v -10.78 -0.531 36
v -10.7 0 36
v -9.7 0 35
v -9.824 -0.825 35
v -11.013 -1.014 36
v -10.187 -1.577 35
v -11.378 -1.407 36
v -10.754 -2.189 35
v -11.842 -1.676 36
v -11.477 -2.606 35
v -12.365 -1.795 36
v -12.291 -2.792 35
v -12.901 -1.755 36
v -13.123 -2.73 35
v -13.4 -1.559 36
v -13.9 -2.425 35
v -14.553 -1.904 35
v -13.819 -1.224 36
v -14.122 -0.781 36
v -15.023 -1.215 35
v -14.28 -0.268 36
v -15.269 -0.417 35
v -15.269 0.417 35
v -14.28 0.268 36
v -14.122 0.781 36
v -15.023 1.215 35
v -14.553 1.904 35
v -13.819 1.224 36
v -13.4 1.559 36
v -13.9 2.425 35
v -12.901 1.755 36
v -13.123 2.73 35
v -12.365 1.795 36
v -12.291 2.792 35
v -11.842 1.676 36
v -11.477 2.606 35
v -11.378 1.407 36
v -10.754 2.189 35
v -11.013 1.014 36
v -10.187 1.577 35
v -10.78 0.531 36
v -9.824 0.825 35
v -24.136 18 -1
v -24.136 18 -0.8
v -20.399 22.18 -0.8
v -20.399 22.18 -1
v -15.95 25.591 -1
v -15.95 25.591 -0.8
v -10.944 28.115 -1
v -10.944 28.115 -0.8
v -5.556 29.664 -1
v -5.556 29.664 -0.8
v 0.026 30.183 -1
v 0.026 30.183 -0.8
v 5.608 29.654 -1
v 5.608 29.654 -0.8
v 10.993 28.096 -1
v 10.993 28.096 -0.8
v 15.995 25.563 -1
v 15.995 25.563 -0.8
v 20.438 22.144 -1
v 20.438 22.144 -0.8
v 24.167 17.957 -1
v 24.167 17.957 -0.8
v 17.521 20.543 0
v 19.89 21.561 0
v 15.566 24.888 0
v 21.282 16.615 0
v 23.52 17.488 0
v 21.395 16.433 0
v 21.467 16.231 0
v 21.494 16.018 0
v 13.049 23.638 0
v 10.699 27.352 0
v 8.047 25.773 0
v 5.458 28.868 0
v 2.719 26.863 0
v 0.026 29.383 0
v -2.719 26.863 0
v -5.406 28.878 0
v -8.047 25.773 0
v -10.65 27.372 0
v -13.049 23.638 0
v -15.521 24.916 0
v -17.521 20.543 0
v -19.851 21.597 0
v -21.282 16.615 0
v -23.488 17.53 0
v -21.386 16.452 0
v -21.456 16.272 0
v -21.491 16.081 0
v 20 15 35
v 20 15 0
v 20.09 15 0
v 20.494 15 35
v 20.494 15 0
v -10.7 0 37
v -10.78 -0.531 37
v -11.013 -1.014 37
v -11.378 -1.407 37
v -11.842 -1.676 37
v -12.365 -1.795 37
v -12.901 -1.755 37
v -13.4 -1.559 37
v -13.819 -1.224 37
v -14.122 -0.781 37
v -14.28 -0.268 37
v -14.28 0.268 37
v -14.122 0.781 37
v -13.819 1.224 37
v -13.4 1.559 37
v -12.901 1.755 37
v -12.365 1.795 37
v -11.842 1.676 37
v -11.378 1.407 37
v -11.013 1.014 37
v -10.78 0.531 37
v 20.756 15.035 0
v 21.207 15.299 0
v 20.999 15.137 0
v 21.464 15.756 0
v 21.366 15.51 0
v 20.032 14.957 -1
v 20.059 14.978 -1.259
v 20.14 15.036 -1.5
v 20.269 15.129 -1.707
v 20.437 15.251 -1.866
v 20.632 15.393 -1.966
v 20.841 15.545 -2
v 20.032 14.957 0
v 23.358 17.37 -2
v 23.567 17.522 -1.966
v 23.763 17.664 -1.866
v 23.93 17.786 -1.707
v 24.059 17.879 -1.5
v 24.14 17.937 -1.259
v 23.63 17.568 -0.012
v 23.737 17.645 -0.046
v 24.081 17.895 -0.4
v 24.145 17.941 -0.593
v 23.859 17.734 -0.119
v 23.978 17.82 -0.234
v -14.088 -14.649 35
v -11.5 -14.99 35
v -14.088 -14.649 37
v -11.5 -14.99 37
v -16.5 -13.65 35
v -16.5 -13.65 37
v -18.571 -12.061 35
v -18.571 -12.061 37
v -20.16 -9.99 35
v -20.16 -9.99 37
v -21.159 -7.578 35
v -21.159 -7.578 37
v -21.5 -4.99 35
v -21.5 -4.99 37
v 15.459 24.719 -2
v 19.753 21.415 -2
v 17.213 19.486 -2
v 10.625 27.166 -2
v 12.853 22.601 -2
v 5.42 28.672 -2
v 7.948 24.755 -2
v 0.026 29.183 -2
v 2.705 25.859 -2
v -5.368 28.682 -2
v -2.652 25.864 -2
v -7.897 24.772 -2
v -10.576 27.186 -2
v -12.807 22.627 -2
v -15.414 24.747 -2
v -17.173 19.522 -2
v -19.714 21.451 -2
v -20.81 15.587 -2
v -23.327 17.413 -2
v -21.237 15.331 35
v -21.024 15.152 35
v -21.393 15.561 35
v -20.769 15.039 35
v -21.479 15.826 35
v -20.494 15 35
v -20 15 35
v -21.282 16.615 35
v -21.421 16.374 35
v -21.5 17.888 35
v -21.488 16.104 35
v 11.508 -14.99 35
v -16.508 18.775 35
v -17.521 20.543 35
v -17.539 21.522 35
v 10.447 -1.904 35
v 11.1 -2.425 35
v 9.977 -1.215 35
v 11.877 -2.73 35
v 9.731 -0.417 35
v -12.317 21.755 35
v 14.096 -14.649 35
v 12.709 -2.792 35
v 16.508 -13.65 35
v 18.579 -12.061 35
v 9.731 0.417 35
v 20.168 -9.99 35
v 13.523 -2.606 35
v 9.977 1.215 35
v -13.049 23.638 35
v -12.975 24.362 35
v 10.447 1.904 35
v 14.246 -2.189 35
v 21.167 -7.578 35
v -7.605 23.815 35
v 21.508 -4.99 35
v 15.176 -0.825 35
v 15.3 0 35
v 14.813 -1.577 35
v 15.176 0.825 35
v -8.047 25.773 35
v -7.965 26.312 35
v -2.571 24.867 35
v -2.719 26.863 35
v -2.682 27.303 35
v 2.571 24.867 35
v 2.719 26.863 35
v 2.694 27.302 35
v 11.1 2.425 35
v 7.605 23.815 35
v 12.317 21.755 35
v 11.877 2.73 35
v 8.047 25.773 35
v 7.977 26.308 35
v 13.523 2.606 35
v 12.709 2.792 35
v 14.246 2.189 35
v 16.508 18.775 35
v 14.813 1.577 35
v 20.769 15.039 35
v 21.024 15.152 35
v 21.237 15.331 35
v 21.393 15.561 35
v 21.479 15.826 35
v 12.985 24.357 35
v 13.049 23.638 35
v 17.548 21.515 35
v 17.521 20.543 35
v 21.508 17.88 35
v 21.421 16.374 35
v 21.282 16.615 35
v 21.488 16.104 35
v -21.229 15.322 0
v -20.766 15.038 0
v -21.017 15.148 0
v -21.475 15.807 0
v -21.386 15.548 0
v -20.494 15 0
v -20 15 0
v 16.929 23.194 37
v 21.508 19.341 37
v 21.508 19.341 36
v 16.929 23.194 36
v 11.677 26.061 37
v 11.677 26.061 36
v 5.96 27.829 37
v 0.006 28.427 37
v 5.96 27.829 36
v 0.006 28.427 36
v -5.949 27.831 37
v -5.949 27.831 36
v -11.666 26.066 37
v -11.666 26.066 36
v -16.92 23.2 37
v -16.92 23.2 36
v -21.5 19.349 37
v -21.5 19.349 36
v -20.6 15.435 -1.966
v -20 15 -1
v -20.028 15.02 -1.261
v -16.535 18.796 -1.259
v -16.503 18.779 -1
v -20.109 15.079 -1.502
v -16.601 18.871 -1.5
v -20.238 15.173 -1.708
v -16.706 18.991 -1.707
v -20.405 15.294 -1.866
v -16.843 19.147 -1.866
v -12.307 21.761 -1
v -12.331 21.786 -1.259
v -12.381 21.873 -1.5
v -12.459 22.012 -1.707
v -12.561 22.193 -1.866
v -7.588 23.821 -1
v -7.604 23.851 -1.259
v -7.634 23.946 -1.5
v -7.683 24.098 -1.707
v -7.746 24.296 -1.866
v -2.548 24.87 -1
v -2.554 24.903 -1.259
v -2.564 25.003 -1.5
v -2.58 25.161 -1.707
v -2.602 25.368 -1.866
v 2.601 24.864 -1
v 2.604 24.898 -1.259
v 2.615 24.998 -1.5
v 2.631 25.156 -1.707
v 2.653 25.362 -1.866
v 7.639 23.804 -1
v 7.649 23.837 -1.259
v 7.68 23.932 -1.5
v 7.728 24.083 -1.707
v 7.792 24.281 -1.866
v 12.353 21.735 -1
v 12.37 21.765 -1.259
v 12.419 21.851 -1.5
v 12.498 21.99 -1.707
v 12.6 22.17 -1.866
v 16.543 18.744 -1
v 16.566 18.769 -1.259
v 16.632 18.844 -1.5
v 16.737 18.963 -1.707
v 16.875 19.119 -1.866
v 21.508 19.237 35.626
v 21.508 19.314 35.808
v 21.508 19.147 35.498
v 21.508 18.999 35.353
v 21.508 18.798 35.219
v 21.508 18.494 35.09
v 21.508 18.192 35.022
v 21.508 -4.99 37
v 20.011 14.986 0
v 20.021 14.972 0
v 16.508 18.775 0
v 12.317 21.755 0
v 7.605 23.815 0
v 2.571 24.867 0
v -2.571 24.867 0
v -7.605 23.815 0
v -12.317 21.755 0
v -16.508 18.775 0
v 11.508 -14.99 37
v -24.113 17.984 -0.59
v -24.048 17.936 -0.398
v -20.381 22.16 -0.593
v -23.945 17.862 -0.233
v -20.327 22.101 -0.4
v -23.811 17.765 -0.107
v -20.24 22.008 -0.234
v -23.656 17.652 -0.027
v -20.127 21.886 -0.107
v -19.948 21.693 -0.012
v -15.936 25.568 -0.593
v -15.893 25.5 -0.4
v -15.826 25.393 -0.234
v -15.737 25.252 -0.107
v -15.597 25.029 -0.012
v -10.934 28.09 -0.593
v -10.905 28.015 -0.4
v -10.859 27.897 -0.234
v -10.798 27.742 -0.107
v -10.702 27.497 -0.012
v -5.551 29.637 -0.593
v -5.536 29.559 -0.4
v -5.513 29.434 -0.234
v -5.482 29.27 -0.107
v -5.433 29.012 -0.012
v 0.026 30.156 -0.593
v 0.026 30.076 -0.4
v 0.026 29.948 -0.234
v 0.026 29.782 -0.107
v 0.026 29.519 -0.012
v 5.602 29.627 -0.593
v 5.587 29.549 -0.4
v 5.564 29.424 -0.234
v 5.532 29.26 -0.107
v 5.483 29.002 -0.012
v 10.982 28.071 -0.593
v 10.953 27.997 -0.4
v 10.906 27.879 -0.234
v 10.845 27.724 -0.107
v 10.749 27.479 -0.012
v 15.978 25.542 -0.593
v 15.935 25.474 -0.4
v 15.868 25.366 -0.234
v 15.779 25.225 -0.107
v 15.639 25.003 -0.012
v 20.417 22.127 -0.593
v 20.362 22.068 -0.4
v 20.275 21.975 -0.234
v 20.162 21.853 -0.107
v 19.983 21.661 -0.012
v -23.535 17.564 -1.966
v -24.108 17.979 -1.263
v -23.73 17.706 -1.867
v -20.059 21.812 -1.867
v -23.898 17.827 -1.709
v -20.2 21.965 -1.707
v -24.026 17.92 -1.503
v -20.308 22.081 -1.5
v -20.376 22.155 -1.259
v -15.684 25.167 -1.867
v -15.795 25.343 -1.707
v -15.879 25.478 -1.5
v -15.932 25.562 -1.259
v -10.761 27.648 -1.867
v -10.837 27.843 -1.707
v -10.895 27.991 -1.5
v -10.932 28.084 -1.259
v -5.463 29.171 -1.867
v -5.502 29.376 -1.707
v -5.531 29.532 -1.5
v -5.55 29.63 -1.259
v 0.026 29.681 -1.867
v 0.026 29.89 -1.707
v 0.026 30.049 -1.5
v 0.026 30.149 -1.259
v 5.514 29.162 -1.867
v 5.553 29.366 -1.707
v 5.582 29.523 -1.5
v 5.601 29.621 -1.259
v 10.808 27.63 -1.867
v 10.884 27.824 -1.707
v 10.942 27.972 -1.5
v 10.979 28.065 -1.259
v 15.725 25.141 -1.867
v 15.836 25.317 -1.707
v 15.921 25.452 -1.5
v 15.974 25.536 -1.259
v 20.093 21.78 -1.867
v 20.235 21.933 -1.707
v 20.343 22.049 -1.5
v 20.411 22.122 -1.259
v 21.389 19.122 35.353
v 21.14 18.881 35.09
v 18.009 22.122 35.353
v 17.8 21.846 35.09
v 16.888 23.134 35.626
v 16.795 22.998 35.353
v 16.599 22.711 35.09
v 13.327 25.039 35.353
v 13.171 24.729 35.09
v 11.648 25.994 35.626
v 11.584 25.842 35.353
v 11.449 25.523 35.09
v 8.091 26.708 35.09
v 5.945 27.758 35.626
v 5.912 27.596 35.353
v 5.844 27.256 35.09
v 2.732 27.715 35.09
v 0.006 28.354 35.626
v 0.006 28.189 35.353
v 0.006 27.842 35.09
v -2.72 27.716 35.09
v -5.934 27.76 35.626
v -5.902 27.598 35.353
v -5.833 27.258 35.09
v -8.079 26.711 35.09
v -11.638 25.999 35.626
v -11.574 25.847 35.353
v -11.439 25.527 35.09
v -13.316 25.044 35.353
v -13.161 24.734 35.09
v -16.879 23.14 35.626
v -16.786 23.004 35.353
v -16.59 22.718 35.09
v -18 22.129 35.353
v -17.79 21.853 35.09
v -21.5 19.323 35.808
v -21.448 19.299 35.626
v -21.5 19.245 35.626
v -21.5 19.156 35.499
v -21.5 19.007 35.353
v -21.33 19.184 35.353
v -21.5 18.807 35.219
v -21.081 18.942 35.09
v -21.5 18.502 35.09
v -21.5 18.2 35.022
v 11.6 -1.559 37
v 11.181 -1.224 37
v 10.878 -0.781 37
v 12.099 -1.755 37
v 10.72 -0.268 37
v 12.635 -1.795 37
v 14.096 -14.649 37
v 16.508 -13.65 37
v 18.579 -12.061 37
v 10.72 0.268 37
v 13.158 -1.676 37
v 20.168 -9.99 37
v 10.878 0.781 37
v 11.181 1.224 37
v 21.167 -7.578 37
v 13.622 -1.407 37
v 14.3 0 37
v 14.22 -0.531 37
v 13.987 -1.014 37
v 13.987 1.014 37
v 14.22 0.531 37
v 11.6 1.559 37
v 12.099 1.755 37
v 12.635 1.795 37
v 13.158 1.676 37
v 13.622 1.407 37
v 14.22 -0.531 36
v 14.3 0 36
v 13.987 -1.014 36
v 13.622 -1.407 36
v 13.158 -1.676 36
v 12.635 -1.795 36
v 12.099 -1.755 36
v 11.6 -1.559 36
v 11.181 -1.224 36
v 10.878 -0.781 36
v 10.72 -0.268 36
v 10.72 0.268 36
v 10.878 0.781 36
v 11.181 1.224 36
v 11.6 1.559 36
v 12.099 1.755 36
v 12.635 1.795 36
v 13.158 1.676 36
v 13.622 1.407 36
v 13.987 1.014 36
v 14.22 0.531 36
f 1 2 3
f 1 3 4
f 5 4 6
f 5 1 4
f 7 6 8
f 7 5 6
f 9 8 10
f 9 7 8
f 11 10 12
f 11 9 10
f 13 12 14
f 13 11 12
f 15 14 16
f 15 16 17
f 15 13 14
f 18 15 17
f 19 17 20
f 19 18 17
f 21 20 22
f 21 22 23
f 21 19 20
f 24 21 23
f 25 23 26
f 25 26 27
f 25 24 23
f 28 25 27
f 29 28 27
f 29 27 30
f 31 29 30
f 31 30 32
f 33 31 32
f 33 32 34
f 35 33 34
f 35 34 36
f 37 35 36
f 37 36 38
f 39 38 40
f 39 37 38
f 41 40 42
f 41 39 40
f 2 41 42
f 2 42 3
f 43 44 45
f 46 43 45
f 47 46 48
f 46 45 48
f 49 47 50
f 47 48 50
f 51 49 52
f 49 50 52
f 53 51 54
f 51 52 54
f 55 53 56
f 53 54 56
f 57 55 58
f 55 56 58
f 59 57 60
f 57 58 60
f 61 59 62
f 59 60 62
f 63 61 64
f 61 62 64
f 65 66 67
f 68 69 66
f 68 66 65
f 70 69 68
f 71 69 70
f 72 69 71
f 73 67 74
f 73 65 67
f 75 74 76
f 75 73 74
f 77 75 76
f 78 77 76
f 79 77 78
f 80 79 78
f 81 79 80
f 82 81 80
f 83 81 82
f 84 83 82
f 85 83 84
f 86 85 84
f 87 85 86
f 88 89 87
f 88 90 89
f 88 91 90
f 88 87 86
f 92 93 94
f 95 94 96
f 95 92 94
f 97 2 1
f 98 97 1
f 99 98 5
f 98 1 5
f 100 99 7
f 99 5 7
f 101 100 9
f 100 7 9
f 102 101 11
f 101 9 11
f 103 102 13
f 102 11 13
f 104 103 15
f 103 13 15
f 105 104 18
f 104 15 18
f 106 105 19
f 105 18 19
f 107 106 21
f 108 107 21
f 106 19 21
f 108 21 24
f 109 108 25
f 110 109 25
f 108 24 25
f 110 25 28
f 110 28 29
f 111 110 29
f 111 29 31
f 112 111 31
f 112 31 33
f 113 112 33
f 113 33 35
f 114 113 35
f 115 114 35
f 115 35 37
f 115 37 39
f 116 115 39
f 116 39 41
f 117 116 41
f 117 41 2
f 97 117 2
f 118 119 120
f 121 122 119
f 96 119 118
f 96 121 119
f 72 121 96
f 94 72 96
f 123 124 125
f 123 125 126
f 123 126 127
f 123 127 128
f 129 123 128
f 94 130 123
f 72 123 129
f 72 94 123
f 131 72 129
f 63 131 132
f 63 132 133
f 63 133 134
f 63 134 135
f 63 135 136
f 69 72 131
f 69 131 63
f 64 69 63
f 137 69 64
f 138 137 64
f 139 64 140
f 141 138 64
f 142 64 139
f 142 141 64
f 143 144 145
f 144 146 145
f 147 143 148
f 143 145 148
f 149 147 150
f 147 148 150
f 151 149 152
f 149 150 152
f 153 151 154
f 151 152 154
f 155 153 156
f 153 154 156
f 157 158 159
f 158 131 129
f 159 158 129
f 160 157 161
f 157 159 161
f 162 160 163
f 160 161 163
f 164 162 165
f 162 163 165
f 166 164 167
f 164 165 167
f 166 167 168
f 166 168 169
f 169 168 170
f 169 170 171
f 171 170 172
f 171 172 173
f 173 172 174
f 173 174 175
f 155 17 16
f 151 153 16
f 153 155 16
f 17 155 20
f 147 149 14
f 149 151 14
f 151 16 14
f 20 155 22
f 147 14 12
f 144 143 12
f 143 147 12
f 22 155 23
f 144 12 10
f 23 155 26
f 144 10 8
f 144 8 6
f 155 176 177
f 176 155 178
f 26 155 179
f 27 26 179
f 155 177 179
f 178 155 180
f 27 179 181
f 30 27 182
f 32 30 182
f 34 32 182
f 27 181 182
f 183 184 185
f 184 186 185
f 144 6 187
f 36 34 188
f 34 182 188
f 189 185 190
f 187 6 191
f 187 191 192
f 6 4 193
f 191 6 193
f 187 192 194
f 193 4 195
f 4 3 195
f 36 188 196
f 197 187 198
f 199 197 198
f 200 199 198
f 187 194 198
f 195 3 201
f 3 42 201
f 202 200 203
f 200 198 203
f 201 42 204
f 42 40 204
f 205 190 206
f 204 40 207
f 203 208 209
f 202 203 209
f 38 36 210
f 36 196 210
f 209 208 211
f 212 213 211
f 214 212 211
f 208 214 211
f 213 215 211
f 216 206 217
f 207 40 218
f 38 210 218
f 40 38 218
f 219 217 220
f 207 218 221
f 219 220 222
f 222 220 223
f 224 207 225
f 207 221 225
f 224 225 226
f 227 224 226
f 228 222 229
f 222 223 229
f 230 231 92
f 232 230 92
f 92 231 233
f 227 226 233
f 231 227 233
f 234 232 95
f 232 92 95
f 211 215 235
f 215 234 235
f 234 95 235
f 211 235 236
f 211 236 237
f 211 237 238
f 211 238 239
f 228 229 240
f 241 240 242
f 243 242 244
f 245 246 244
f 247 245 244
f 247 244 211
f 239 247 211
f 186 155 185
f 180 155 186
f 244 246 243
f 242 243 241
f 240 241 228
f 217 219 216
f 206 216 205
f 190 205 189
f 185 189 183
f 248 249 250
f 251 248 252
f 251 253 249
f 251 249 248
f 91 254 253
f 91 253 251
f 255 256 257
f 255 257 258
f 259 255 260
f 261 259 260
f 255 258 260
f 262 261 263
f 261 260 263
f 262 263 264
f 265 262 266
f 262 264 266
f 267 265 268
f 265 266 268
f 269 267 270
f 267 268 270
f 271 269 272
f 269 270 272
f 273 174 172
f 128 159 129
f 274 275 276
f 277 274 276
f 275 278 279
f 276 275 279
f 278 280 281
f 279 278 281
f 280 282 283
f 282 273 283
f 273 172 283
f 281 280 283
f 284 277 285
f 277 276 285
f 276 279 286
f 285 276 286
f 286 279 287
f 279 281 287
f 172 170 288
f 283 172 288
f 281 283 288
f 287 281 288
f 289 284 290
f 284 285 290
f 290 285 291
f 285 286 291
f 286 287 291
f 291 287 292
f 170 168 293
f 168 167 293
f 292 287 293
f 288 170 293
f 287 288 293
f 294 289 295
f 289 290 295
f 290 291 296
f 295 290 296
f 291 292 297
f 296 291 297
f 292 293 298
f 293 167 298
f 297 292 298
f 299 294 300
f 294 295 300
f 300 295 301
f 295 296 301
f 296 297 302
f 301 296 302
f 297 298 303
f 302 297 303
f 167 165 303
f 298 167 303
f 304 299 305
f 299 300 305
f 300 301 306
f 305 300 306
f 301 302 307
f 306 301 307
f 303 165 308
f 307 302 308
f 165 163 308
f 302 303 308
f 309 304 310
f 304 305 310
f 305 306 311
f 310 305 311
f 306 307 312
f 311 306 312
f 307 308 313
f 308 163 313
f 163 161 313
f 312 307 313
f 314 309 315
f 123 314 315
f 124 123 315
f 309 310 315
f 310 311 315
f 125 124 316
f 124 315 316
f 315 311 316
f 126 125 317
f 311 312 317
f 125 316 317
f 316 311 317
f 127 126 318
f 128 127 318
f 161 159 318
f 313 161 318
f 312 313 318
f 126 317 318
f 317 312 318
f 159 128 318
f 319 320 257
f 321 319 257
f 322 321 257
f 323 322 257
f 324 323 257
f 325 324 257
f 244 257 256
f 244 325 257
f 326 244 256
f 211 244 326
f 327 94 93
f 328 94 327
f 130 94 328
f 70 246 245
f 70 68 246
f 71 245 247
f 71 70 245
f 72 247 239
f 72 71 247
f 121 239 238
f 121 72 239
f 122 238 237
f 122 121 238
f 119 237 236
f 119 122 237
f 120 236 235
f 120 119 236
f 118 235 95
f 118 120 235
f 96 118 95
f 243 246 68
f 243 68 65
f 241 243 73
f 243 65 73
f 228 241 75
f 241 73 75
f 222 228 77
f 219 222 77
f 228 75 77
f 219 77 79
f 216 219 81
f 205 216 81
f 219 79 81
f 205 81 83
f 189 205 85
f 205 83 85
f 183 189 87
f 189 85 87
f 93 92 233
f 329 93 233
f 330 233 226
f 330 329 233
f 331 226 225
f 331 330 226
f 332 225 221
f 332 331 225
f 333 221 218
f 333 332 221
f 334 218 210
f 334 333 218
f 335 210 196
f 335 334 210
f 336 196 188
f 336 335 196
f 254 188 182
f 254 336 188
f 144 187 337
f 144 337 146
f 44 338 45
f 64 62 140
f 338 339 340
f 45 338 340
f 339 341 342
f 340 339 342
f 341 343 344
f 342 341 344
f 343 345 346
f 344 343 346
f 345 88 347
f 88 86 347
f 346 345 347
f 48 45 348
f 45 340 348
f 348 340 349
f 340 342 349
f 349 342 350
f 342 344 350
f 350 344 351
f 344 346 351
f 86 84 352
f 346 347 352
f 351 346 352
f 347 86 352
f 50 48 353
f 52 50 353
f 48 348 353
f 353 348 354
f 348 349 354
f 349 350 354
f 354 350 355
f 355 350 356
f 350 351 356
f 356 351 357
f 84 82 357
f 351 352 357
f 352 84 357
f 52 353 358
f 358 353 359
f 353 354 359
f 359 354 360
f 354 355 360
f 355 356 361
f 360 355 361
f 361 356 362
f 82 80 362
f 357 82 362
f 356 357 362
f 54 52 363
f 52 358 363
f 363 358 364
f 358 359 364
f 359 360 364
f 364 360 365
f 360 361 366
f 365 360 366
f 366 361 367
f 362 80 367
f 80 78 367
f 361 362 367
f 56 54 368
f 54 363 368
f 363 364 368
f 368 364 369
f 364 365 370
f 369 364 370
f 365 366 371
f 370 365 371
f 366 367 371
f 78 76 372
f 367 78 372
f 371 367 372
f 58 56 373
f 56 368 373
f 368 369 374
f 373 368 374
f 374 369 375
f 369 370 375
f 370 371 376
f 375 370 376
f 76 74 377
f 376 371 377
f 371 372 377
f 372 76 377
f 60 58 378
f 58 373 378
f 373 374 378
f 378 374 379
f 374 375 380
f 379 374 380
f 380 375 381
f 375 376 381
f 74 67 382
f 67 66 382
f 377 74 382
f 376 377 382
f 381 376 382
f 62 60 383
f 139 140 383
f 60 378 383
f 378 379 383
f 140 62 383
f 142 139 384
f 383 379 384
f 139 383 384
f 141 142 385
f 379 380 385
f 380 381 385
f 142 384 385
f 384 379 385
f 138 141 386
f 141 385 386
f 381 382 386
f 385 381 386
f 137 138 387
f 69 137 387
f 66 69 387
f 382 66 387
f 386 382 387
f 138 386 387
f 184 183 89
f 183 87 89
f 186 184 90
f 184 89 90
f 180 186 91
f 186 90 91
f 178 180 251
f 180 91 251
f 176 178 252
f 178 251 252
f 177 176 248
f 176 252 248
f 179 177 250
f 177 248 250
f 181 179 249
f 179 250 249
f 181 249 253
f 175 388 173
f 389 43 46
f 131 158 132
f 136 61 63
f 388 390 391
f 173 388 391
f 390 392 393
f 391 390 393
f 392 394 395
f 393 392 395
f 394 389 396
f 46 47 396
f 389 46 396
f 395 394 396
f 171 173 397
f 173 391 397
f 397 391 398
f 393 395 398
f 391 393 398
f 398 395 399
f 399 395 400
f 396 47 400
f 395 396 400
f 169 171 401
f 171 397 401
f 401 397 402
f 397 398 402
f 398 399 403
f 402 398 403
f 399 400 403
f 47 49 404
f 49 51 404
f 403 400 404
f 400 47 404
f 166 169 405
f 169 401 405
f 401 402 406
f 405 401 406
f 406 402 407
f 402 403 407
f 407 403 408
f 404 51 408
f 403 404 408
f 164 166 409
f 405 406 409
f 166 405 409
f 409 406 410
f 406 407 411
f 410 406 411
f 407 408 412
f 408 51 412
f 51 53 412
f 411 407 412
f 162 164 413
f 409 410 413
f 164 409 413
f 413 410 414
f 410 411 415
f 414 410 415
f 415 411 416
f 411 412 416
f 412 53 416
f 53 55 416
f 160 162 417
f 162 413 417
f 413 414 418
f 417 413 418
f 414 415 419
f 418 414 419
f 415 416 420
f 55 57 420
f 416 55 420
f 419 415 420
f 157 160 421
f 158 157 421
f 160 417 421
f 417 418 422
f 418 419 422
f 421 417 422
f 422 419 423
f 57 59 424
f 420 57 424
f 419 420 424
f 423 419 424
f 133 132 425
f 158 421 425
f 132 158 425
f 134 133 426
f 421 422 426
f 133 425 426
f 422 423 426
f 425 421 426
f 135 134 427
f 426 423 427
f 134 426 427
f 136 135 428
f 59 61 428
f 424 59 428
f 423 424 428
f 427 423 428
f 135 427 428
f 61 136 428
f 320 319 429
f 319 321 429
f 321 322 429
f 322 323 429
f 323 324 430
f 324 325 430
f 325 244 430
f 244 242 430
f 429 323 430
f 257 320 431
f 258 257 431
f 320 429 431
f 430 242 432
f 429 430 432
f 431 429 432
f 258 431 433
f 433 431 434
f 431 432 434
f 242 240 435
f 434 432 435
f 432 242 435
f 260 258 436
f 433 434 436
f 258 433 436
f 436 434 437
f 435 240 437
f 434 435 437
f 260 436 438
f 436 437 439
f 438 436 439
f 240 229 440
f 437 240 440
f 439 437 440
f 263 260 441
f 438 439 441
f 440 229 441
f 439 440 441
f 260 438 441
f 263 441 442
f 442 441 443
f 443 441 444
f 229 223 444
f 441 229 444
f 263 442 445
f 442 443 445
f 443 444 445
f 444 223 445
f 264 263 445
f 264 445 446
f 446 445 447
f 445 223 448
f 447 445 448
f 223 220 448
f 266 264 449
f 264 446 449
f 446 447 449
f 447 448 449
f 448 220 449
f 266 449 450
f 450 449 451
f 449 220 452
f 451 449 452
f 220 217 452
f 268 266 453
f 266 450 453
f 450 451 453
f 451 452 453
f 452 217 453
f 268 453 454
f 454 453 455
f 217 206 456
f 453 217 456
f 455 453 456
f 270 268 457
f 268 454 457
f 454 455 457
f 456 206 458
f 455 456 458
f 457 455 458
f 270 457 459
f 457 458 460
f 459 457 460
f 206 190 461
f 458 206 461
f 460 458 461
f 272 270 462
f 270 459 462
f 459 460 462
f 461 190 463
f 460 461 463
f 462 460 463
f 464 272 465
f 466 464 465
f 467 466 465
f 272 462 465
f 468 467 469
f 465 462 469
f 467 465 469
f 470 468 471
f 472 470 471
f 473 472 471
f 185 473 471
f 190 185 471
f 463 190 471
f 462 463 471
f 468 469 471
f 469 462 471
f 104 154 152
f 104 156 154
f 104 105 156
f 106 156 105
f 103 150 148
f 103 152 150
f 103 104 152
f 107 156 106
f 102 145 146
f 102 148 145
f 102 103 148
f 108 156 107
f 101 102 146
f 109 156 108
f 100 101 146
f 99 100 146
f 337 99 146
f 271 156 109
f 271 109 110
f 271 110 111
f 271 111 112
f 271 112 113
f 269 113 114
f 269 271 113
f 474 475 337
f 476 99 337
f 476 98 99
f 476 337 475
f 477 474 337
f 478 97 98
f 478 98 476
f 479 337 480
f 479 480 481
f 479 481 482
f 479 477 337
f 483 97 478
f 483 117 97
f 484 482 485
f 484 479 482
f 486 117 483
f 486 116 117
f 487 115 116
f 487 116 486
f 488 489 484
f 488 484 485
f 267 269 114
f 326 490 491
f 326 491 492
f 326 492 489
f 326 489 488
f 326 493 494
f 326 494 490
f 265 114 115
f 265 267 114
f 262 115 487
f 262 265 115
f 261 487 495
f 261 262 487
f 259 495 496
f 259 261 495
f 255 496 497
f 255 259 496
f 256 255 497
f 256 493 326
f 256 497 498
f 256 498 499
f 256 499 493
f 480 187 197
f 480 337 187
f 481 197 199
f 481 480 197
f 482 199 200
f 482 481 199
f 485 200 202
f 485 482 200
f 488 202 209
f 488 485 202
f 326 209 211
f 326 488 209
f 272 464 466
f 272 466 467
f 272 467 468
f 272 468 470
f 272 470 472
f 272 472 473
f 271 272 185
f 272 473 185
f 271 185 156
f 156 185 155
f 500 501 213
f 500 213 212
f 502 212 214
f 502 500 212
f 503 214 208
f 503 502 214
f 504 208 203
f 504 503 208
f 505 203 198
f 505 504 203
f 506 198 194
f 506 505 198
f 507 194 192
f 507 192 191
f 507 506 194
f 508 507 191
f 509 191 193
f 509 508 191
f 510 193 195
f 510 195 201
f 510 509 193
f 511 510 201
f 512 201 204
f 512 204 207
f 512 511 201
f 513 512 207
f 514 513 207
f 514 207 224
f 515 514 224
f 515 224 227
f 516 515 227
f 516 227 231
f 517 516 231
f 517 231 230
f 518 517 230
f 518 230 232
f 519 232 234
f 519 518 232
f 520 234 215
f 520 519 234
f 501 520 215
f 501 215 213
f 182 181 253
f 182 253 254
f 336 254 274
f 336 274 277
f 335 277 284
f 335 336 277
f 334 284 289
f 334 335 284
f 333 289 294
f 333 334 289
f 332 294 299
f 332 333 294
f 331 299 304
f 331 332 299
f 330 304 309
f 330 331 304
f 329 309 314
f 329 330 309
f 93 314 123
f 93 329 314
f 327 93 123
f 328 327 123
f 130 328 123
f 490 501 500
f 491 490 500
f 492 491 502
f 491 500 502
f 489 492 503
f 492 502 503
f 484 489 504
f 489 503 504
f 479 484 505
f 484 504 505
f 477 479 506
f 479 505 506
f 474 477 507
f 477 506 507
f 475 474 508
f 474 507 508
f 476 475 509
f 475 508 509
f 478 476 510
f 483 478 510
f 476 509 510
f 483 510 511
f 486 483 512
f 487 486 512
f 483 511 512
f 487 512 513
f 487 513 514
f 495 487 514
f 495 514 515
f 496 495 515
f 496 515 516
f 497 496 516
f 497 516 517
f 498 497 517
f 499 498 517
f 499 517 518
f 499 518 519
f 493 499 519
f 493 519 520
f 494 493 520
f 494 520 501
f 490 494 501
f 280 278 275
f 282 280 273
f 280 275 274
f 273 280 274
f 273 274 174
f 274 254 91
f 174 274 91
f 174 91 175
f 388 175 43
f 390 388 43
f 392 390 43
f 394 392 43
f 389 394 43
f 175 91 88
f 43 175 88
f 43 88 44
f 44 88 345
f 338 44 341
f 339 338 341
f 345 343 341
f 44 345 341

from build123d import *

# Parameters (mm, degrees)
PAD_DEPTH       = 35
SKETCH001_W     = 64.566103
SKETCH001_H     = 15
POCKET_DEPTH    = 35
PAD001_DEPTH    = 2
FILLET_R        = 1
FILLET001_R     = 1
FILLET002_R     = 1
FILLET003_R     = 1
FILLET004_R     = 1
PAD002_DEPTH    = 2
FILLET005_R     = 1
FILLET006_R     = 1
FILLET007_R     = 0.8
SKETCH005_R     = 1.8
POCKET001_DEPTH = 5
CHAMFER_SIZE    = 1
CHAMFER001_SIZE = 1
SKETCH006_W     = 10.45074
SKETCH006_H     = 39.185364
POCKET002_DEPTH = 5
SKETCH007_W     = 9.636787
SKETCH007_H     = 41.557176
POCKET003_DEPTH = 5
FILLET008_R     = 10
FILLET009_R     = 10


with BuildPart() as part:
    # Sketch → Pad (new body)
    with BuildSketch(Plane.XY):
        with BuildLine():
            ThreePointArc((25, 0), (0, 25), (-25, 0))
            Line((-27, 0), (-25, 0))
            ThreePointArc((27, 0), (0, 27), (-27, 0))
            Line((27, 0), (25, 0))
        make_face()
    extrude(amount=PAD_DEPTH)

    # Sketch001 (on Face6 of Pad) → Pocket (cut)
    with BuildSketch(Plane.XY.offset(35)):
        with Locations((1.810268, 7.5)):
            Rectangle(SKETCH001_W, SKETCH001_H)
    extrude(amount=-POCKET_DEPTH, mode=Mode.SUBTRACT)

    # Sketch003 (on Face4 of Pocket) → Pad001 (join)
    with BuildSketch(Plane.XY.offset(35)):
        with BuildLine():
            ThreePointArc((25, 15.01), (0, 28.426876), (-25, 15.01))
            Line((-25, -14.99), (-25, 15.01))
            Line((25, -14.99), (-25, -14.99))
            Line((25, 15.01), (25, -14.99))
        make_face()
    extrude(amount=PAD001_DEPTH)

    # Fillet
    fillet_edges = [part.edges().sort_by_distance(p)[0] for p in [
        (25, 0.01, 35),
    ]]
    fillet(fillet_edges, radius=FILLET_R)

    # Fillet001
    fillet001_edges = [part.edges().sort_by_distance(p)[0] for p in [
        (-0.867113, 28.414342, 35),
    ]]
    fillet(fillet001_edges, radius=FILLET001_R)

    # Fillet002
    fillet002_edges = [part.edges().sort_by_distance(p)[0] for p in [
        (-25, -0.933093, 35),
    ]]
    fillet(fillet002_edges, radius=FILLET002_R)

    # Fillet003
    fillet003_edges = [part.edges().sort_by_distance(p)[0] for p in [
        (-22.449944, 15, 17.5),
    ]]
    fillet(fillet003_edges, radius=FILLET003_R)

    # Fillet004
    fillet004_edges = [part.edges().sort_by_distance(p)[0] for p in [
        (22.449944, 15, 17.5),
    ]]
    fillet(fillet004_edges, radius=FILLET004_R)

    # Sketch004 (on Face14 of Fillet004) → Pad002 (join)
    with BuildSketch(Plane(origin=(0, 0, 0), x_dir=(1, 0, 0), z_dir=(0, 0, -1))):
        with BuildLine():
            ThreePointArc((-20, -15), (0.026547, -24.999986), (20.031811, -14.957491))
            Line((20.031811, -14.957491), (24.167366, -17.957491))
            ThreePointArc((-24.136043, -18), (0.026401, -30.182822), (24.167366, -17.957491))
            Line((-20, -15), (-24.136043, -18))
        make_face()
    extrude(amount=PAD002_DEPTH)

    # Fillet005
    fillet005_edges = [part.edges().sort_by_distance(p)[0] for p in [
        (0.026547, 24.999986, -2),
    ]]
    fillet(fillet005_edges, radius=FILLET005_R)

    # Fillet006
    fillet006_edges = [part.edges().sort_by_distance(p)[0] for p in [
        (0.026401, 30.182822, -2),
    ]]
    fillet(fillet006_edges, radius=FILLET006_R)

    # Fillet007
    fillet007_edges = [part.edges().sort_by_distance(p)[0] for p in [
        (0.026401, 30.182822, 0),
    ]]
    fillet(fillet007_edges, radius=FILLET007_R)

    # Sketch005 (on Face18 of Fillet007) → Pocket001 (cut)
    with BuildSketch(Plane(origin=(0, 0, 35), x_dir=(1, 0, 0), z_dir=(0, 0, -1))):
        with Locations((-12.5, 0)):
            Circle(SKETCH005_R)
        with Locations((12.5, 0)):
            Circle(SKETCH005_R)
    extrude(amount=-POCKET001_DEPTH, mode=Mode.SUBTRACT)

    # Chamfer
    chamfer_edges = [part.edges().sort_by_distance(p)[0] for p in [
        (10.7, 0, 35),
    ]]
    chamfer(chamfer_edges, length=CHAMFER_SIZE)

    # Chamfer001
    chamfer001_edges = [part.edges().sort_by_distance(p)[0] for p in [
        (-14.3, 0, 35),
    ]]
    chamfer(chamfer001_edges, length=CHAMFER001_SIZE)

    # Sketch006 (on Face1 of Chamfer001) → Pocket002 (cut)
    with BuildSketch(Plane(origin=(0, 0, 35), x_dir=(1, 0, 0), z_dir=(0, 0, -1))):
        with Locations((-26.72537, -2.508844)):
            Rectangle(SKETCH006_W, SKETCH006_H)
    extrude(amount=-POCKET002_DEPTH, mode=Mode.SUBTRACT)

    # Sketch007 (on Face1 of Pocket002) → Pocket003 (cut)
    with BuildSketch(Plane(origin=(0, 0, 35), x_dir=(1, 0, 0), z_dir=(0, 0, -1))):
        with Locations((26.326259, -1.833993)):
            Rectangle(SKETCH007_W, SKETCH007_H)
    extrude(amount=-POCKET003_DEPTH, mode=Mode.SUBTRACT)

    # Fillet008
    fillet008_edges = [part.edges().sort_by_distance(p)[0] for p in [
        (21.507866, -14.99, 36),
    ]]
    fillet(fillet008_edges, radius=FILLET008_R)

    # Fillet009
    fillet009_edges = [part.edges().sort_by_distance(p)[0] for p in [
        (-21.5, -14.99, 36),
    ]]
    fillet(fillet009_edges, radius=FILLET009_R)


solid = part.part
